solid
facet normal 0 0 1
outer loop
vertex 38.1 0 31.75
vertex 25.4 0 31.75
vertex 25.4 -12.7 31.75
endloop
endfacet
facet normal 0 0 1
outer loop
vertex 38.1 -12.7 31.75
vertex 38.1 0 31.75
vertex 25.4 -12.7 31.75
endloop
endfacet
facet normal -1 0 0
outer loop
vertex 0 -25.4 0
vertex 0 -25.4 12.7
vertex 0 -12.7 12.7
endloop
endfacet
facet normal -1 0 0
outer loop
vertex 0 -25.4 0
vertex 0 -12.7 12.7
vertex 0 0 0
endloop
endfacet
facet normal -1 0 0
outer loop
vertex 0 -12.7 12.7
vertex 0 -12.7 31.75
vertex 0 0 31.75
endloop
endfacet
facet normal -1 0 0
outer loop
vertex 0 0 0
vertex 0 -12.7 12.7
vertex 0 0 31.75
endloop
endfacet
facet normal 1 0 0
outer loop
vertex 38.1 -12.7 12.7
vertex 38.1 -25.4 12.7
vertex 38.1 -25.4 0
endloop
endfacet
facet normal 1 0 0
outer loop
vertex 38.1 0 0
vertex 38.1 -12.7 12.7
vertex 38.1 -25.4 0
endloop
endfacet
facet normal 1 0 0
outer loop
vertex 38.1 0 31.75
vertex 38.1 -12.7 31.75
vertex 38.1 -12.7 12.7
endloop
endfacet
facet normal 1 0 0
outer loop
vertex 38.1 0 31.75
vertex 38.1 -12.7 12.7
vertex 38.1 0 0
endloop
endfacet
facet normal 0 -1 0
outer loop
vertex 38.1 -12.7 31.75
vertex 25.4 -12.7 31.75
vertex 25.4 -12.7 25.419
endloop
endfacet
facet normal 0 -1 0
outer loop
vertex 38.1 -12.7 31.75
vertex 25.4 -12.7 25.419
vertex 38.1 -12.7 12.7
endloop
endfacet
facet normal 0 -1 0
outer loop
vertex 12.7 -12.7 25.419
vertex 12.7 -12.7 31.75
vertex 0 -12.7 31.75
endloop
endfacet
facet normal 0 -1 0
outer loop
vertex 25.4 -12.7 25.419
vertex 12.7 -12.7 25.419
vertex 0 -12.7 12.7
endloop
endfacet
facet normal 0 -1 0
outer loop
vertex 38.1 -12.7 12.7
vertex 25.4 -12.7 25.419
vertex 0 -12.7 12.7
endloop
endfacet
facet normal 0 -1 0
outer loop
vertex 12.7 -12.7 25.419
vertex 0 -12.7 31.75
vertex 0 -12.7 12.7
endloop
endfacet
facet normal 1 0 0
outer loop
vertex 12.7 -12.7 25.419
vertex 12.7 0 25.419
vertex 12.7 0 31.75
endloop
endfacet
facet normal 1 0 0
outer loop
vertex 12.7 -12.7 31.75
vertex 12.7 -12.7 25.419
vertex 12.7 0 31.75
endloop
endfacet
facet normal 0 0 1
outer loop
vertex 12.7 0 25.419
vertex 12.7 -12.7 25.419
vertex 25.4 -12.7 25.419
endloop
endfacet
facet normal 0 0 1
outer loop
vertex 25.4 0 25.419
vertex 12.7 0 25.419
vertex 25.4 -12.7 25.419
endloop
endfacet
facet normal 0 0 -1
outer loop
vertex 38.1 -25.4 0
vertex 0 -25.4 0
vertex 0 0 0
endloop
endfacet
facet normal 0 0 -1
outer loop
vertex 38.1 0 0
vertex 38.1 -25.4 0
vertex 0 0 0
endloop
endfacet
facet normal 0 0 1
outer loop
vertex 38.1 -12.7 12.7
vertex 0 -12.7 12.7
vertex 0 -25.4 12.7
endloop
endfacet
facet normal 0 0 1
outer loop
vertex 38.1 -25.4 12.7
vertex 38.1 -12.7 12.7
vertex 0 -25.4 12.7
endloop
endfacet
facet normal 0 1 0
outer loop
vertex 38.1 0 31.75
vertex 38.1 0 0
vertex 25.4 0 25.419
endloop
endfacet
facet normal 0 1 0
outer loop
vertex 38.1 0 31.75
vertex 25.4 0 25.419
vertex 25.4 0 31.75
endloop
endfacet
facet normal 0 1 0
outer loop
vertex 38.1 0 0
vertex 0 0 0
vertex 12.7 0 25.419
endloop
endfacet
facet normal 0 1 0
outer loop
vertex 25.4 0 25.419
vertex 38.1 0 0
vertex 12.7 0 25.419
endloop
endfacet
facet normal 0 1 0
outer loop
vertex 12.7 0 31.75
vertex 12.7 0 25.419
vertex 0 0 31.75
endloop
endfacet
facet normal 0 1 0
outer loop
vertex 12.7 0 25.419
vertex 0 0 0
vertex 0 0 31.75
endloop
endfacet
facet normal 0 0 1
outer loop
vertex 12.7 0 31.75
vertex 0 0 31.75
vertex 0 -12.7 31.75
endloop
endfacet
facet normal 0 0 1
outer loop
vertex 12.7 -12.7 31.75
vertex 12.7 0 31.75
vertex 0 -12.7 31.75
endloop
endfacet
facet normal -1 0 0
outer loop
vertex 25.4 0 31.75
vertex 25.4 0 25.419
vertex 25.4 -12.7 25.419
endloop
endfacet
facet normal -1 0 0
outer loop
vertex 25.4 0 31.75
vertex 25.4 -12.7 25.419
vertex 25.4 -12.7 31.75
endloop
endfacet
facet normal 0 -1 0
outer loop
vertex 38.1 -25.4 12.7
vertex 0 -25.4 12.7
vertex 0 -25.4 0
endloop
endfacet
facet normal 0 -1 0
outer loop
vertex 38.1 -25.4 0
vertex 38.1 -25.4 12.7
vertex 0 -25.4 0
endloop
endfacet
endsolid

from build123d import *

# Parameters (mm, degrees)
F1_DEPTH = 38.1
F2_W     = 12.7
F2_H     = 6.35
F3_DEPTH = 81
F4_W     = 12.7
F4_H     = 6.35
F5_DEPTH = 81
F6_W     = 12.7
F6_H     = 6.35
F7_DEPTH = 81
F8_DEPTH = 25.401


# Not quite as in the source:
# - an extrude ends at something that could not be found from the text; its depth is read off the source's solid


with BuildPart() as f1:
    # F0 (on Right) → F1 (new body)
    with BuildSketch(Plane.YZ):
        Polygon((0, 0), (0, 31.75), (-12.7, 31.75), (-12.7, 12.7), (-25.4, 12.7), (-25.4, 0), align=None)
    extrude(amount=F1_DEPTH)

    # F2 (on Front) → F3 (cut, through all)
    with BuildSketch(Plane.XZ):
        with Locations((19.05, 29.0438578556)):
            Rectangle(F2_W, F2_H)
    extrude(amount=-F3_DEPTH, mode=Mode.SUBTRACT)

    # F4 (on Front) → F5 (cut, through all)
    with BuildSketch(Plane.XZ):
        with Locations((19.05, 28.5938853313)):
            Rectangle(F4_W, F4_H)
    extrude(amount=-F5_DEPTH, mode=Mode.SUBTRACT)

    # F6 (on Front) → F7 (cut, through all)
    with BuildSketch(Plane.XZ):
        with Locations((19.05, 28.9610116338)):
            Rectangle(F6_W, F6_H)
    extrude(amount=-F7_DEPTH, mode=Mode.SUBTRACT)

    # F4 (on Front) → F8 (cut, through all)
    with BuildSketch(Plane.XZ):
        with Locations((19.05, 28.5938853313)):
            Rectangle(F4_W, F4_H)
    extrude(amount=F8_DEPTH, mode=Mode.SUBTRACT)


solid = f1.part
